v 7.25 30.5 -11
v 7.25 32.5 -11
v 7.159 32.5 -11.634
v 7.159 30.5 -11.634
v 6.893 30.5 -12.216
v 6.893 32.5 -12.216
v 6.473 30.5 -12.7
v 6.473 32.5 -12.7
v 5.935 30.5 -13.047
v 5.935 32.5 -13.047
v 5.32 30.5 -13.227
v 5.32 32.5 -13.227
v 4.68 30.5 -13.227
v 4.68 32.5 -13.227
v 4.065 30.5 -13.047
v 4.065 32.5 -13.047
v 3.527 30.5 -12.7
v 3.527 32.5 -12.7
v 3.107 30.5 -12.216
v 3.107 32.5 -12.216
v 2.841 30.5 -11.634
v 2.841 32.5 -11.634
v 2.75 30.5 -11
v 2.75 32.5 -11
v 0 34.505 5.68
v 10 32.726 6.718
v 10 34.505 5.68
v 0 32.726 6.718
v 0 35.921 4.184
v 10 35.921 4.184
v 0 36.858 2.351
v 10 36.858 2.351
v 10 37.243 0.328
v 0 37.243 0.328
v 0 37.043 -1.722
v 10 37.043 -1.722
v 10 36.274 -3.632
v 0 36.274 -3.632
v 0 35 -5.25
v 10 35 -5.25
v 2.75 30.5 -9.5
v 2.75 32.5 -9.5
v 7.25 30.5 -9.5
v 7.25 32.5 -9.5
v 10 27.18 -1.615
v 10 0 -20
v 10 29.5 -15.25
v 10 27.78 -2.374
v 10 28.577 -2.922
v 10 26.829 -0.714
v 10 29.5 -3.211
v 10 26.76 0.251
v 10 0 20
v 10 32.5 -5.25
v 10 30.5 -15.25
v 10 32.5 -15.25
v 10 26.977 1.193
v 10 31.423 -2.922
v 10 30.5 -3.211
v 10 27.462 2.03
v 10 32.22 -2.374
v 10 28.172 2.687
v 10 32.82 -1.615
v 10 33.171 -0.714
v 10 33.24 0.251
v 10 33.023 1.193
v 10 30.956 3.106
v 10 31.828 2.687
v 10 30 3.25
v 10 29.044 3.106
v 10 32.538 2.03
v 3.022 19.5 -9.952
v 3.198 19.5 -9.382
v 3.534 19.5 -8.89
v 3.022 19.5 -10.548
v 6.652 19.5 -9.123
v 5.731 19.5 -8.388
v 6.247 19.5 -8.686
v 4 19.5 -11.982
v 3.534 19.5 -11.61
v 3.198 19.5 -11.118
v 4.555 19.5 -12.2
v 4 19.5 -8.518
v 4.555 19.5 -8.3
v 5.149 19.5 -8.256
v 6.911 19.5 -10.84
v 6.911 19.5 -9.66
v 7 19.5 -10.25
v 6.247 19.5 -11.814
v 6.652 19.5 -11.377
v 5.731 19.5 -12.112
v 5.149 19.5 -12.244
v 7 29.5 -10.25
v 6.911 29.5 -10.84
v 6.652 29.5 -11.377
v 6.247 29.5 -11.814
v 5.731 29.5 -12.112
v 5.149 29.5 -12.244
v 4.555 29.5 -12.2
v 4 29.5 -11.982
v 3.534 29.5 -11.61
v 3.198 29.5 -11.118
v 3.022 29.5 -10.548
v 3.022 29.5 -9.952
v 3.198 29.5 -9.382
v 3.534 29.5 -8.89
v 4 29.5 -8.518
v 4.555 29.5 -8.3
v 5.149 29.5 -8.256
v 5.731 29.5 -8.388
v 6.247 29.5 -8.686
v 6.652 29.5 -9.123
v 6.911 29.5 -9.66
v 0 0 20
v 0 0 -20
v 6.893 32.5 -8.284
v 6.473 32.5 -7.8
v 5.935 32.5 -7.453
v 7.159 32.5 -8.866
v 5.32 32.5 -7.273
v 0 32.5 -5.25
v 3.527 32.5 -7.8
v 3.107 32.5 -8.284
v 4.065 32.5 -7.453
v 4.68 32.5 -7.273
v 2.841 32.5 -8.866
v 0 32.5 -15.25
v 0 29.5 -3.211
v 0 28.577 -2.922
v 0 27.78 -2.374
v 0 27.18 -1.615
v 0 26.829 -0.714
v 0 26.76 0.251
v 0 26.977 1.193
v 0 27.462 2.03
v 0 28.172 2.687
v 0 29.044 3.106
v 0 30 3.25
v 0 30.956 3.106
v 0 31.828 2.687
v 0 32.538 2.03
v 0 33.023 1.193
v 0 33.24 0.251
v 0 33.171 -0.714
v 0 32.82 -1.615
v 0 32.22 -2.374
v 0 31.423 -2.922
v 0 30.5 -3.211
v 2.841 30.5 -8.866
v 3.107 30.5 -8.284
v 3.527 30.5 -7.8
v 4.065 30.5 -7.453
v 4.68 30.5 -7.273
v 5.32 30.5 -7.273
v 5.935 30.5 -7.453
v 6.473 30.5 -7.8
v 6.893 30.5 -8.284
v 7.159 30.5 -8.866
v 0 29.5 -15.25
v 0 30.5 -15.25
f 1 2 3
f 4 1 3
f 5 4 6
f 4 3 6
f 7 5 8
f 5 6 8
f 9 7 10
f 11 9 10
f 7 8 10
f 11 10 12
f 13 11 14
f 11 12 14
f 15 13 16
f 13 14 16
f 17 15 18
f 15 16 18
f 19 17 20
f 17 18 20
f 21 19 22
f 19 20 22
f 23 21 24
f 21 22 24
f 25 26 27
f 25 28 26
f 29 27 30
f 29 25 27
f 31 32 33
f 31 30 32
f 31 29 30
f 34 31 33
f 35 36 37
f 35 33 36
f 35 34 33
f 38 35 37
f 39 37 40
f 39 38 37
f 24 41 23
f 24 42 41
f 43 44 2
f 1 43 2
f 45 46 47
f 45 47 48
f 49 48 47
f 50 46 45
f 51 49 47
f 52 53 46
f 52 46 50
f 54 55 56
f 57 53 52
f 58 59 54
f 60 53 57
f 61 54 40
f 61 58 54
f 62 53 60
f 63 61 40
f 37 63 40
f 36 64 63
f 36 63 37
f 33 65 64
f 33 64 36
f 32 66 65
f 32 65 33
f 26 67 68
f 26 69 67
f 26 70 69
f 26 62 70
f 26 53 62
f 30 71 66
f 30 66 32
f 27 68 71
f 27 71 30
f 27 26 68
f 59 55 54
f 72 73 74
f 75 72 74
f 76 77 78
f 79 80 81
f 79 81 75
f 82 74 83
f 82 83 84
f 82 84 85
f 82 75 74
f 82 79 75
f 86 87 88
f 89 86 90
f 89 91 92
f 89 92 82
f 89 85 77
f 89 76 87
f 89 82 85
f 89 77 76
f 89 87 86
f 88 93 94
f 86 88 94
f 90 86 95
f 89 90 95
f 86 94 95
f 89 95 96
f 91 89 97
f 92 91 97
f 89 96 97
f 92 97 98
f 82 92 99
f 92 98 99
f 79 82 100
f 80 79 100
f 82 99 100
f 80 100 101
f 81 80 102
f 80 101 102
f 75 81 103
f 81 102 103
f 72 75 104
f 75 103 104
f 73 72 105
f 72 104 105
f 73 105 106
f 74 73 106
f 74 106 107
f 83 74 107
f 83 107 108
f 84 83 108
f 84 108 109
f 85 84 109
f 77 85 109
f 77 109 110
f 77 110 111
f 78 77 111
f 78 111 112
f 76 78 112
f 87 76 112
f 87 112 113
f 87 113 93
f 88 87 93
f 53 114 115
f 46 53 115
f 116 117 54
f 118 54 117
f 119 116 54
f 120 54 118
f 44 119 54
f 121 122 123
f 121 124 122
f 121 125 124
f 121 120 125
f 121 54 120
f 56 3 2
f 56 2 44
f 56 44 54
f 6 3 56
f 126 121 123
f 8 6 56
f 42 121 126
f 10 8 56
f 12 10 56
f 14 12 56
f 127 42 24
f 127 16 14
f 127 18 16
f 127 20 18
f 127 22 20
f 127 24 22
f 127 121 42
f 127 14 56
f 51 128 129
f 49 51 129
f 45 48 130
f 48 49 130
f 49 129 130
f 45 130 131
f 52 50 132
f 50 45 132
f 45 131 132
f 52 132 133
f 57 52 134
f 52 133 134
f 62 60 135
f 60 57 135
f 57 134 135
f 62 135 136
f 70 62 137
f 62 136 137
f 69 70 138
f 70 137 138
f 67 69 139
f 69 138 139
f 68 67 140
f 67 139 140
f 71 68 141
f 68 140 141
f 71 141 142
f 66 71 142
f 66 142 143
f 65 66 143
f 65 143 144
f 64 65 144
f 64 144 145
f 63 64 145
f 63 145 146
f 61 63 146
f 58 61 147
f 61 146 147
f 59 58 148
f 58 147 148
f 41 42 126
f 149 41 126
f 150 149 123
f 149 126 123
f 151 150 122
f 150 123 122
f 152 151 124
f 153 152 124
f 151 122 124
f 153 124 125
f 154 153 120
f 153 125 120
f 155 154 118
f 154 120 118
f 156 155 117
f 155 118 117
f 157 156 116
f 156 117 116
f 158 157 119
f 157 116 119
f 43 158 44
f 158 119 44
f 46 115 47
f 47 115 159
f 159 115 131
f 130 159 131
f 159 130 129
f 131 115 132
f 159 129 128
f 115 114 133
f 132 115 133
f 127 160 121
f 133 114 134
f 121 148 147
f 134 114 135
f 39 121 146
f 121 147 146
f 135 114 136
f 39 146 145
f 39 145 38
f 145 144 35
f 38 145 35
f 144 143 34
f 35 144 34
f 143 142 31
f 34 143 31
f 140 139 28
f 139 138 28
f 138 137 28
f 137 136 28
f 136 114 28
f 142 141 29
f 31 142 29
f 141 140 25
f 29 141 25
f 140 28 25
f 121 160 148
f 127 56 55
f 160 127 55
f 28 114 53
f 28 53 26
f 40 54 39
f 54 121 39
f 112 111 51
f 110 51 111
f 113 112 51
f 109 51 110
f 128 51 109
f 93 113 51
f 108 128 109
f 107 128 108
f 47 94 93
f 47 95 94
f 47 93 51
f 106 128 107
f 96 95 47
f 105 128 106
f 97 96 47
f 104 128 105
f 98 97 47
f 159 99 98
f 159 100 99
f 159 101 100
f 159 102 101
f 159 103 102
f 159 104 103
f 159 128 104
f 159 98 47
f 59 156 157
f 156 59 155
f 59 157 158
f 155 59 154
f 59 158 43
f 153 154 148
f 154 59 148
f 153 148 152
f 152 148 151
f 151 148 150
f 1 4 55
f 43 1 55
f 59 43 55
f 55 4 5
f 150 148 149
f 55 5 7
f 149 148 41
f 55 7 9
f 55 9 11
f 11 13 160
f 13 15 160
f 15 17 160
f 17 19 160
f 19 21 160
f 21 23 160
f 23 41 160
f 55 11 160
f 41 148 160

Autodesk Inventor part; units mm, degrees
ref_plane "YZ Plane" through (0, 0, 0) normal (1, 0, 0) x (0, 1, 0)
ref_plane "XZ Plane" through (0, 0, 0) normal (0, 1, 0) x (-1, 0, 0)
ref_plane "XY Plane" through (0, 0, 0) normal (0, 0, 1) x (1, 0, 0)
sketch "Sketch1" plane through (0, 0, 0) normal (1, 0, 0) x (0, 1, 0)
  arc A0 (30.5, -3.2113) -> (29.5, -3.2113) centre (30, 0) ccw
  arc A1 (35, -5.25) -> (32.7265, 6.7178) centre (30, 0) ccw
  line L0 (0, 0) -> (50.3094, 0) construction
  line L1 (0, 20) -> (0, -20)
  line L2 (0, 20) -> (32.7265, 6.7178)
  line L3 (30, 0) -> (30, -135) construction
  line L4 (30.5, -3.2113) -> (30.5, -15.25)
  line L5 (32.5, -5.25) -> (32.5, -15.25)
  line L6 (32.5, -5.25) -> (35, -5.25)
  line L7 (32.5, -15.25) -> (30.5, -15.25)
  line L8 (29.5, -3.2113) -> (29.5, -15.25)
  line L9 (0, -20) -> (29.5, -15.25)
  point P0 (30, -3.25)
  dimension "d1" = 6.5
  dimension "d2" = 30
  dimension "d3" = 14.5
  dimension "d4" = 40
  dimension "d17" = 0.5
  dimension "d18" = 10
  dimension "d19" = 2
  dimension "d20" = 2
  dimension "d21" = 1
  dimension "d24" = 20
extrude "Extrusion1" add sketch "Sketch1" along normal blind 10
sketch "Sketch2" plane through (0, 32.5, -5.25) normal (0, 1, 0) x (1, 0, 0)
  line L0 (5, -5.25) -> (5, 25.2229) construction
  line L1 (0, 10) -> (0, 0) construction
  arc A0 (2.75, 4.25) -> (7.25, 4.25) centre (5, 4.25) ccw
  arc A1 (7.25, 5.75) -> (2.75, 5.75) centre (5, 5.75) ccw
  line L2 (2.75, 4.25) -> (2.75, 5.75)
  line L3 (7.25, 4.25) -> (7.25, 5.75)
  line L4 (0, 10) -> (10, 10) projected
  line L5 (0, 10) -> (0, 0) projected
  line L6 (0, 0) -> (10, 0) projected
  line L7 (10, 10) -> (10, 0) projected
  line L8 (0, 10) -> (10, 10) projected
  point P0 (0, -5.25)
  dimension "d27" = 5
  dimension "d28" = 4.5
  dimension "d29" = 4.5
  dimension "d30" = 1.5
  dimension "d31" = 4.25
extrude "Extrusion2" cut sketch "Sketch2" against normal up to surface (2 mm away) contours L2 A1 L3 A0
sketch "Sketch3" plane through (0, 29.5, -3.2113) normal (0, 1, 0) x (1, 0, 0)
  line L0 (2.75, 6.2887) -> (2.75, 7.7887) projected
  arc A0 (7.25, 7.7887) -> (2.75, 7.7887) centre (5, 7.7887) ccw projected
  line L1 (7.25, 7.7887) -> (7.25, 6.2887) projected
  arc A1 (2.75, 6.2887) -> (7.25, 6.2887) centre (5, 6.2887) ccw projected
  line L2 (0, 12.0387) -> (0, 2.0387) projected
  line L3 (0, 2.0387) -> (10, 2.0387) projected
  line L4 (10, 12.0387) -> (10, 2.0387) projected
  line L5 (0, 12.0387) -> (10, 12.0387) projected
  circle A2 centre (5, 7.0387) radius 2
  line L6 (5, 6.2887) -> (5, 7.7887)
  point P0 (0, -3.2113)
  dimension "d34" = 4
  dimension "d35" = 1.5
  dimension "d36" = 0.75
extrude "Extrusion3" cut sketch "Sketch3" against normal blind 10 contours A2
equation "\"d17\" = 0.5 * d21"
equation "\"d24\" = 0.5 * d4"
equation "\"d36\" = 0.5 * d35"
properties part number "mocowanie walka"
